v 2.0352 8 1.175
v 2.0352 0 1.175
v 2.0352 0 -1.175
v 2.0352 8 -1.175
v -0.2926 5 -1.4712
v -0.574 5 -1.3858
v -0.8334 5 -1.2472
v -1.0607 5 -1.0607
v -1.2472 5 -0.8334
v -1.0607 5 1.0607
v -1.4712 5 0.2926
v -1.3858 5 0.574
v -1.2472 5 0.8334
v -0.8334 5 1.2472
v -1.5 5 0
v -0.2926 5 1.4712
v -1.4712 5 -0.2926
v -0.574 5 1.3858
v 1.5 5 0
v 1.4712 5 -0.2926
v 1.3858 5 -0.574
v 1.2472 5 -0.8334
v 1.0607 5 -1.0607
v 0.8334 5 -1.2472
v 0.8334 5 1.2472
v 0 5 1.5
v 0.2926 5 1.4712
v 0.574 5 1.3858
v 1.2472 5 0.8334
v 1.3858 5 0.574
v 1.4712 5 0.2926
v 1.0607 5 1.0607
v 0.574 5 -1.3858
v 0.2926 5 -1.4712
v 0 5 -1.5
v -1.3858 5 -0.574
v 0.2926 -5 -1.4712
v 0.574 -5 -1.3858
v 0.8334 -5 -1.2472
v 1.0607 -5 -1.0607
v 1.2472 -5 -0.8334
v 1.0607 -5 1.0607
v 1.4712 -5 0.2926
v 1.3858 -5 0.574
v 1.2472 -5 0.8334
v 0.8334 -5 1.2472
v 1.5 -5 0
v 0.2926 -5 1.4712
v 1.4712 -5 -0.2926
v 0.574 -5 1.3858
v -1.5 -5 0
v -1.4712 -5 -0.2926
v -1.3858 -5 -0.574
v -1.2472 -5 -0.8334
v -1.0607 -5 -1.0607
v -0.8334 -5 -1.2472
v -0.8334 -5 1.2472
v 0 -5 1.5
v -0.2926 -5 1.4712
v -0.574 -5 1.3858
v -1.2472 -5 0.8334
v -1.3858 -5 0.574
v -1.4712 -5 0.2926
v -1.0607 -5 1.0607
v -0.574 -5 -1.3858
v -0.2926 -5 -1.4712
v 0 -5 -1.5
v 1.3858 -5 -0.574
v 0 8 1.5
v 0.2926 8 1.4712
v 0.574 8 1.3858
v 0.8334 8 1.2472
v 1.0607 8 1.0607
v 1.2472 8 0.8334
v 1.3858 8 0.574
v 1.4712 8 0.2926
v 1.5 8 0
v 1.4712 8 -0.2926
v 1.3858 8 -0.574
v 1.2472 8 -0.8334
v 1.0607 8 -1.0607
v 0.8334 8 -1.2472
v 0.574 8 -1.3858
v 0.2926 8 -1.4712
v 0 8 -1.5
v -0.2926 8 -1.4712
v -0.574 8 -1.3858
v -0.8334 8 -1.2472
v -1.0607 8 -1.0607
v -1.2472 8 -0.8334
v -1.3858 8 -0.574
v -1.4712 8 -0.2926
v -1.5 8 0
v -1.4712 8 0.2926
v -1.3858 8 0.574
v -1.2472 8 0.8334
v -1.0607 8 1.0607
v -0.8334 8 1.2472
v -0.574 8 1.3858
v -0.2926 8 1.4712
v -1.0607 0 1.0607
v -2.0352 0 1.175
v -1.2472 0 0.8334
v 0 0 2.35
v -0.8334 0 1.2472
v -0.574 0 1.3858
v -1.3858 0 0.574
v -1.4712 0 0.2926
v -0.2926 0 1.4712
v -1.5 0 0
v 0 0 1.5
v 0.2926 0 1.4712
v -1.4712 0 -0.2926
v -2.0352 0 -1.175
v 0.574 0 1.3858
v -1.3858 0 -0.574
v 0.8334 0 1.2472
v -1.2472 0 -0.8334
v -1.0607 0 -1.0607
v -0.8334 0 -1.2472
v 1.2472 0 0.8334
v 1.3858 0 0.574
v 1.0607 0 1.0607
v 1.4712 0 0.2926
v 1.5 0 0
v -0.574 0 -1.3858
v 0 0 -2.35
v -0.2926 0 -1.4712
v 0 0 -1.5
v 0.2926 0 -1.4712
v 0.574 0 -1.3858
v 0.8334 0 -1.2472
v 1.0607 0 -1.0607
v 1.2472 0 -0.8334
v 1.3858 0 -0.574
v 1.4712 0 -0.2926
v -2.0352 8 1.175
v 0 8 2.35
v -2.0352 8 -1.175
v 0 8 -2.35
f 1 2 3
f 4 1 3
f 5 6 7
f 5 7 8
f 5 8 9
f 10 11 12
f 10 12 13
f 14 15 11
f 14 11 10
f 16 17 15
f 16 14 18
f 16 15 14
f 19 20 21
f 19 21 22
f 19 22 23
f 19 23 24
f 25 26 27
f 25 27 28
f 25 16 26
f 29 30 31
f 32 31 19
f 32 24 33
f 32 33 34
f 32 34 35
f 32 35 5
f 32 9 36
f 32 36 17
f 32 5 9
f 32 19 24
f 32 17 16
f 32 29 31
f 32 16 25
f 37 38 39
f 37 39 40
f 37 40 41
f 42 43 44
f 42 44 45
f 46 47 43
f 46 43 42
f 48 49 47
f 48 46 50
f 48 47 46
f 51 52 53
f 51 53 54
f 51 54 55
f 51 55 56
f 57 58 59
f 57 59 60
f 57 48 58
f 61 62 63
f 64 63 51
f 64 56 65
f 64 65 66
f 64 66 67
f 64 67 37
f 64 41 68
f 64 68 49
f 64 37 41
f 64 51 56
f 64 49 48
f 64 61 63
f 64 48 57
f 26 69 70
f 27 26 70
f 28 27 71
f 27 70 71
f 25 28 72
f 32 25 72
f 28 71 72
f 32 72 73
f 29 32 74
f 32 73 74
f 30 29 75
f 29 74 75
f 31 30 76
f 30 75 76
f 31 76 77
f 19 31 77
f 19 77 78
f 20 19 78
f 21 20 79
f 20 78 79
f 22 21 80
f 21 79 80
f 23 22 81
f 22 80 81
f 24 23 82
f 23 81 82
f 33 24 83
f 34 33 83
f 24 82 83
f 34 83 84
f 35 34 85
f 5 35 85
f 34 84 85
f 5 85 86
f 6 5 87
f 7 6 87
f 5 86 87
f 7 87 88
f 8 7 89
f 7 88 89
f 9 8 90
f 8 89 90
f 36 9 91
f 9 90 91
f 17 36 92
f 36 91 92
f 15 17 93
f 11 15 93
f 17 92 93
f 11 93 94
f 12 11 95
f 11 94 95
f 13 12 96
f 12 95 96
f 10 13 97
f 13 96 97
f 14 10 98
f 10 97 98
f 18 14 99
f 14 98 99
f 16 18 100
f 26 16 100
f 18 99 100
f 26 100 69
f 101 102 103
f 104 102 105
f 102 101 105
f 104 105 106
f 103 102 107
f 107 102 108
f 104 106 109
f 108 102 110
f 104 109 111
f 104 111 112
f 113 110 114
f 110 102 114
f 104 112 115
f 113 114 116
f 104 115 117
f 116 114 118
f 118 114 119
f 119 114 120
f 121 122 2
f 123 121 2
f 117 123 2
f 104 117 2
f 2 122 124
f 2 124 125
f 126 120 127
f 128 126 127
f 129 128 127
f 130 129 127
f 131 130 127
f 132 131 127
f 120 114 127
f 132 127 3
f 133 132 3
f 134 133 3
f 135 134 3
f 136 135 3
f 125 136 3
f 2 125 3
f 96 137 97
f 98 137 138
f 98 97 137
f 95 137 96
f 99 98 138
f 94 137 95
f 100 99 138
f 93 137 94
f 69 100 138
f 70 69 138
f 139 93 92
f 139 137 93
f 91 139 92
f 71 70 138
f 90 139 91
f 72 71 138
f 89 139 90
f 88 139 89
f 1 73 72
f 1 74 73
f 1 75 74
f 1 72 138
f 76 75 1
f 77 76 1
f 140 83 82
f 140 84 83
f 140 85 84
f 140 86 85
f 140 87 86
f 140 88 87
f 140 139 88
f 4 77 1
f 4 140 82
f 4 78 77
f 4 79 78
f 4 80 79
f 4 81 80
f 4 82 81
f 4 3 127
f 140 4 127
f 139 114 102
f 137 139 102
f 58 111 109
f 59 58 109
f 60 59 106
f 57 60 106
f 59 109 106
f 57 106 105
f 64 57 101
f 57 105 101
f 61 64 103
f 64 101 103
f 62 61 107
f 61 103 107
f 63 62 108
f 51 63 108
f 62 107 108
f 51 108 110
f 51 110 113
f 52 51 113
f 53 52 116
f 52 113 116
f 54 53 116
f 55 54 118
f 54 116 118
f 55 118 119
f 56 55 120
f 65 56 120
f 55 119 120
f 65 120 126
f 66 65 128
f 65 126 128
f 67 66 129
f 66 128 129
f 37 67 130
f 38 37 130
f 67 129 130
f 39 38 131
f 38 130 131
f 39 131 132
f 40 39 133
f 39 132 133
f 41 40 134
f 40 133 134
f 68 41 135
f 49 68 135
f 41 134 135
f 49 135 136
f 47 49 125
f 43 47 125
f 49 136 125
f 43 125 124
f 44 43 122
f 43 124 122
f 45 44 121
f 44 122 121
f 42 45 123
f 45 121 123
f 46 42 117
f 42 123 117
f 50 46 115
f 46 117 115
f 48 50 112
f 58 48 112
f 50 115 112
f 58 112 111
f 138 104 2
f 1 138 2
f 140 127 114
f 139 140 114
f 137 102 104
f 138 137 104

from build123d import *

# Parameters (mm, degrees)
EXTRUDE_1_DEPTH     = 8
SKETCH_2_R          = 1.5
CUT_EXTRUDE_1_DEPTH = 3
SKETCH_3_R          = 1.5
EXTRUDE_2_DEPTH     = 5


with BuildPart() as part:
    # 草图1 → 凸台-拉伸1 (new body)
    with BuildSketch(Plane(origin=(0, 0, 0), x_dir=(1, 0, 0), z_dir=(0, 1, 0))):
        Polygon((0, 2.35), (-2.035159699, 1.175), (-2.035159699, -1.175), (0, -2.35), (2.035159699, -1.175), (2.035159699, 1.175), align=None)
    extrude(amount=EXTRUDE_1_DEPTH)

    # 草图2 → 切除-拉伸1 (cut)
    with BuildSketch(Plane(origin=(0, 8, 0), x_dir=(1, 0, 0), z_dir=(0, 1, 0))):
        with Locations(Location((0, 0, 0), (0, 0, 270))):
            Circle(SKETCH_2_R)
    extrude(amount=-CUT_EXTRUDE_1_DEPTH, mode=Mode.SUBTRACT)

    # 草图3 → 凸台-拉伸2 (add)
    with BuildSketch(Plane.XZ):
        with Locations(Location((0, 0, 0), (0, 0, 90))):
            Circle(SKETCH_3_R)
    extrude(amount=EXTRUDE_2_DEPTH)


solid = part.part
